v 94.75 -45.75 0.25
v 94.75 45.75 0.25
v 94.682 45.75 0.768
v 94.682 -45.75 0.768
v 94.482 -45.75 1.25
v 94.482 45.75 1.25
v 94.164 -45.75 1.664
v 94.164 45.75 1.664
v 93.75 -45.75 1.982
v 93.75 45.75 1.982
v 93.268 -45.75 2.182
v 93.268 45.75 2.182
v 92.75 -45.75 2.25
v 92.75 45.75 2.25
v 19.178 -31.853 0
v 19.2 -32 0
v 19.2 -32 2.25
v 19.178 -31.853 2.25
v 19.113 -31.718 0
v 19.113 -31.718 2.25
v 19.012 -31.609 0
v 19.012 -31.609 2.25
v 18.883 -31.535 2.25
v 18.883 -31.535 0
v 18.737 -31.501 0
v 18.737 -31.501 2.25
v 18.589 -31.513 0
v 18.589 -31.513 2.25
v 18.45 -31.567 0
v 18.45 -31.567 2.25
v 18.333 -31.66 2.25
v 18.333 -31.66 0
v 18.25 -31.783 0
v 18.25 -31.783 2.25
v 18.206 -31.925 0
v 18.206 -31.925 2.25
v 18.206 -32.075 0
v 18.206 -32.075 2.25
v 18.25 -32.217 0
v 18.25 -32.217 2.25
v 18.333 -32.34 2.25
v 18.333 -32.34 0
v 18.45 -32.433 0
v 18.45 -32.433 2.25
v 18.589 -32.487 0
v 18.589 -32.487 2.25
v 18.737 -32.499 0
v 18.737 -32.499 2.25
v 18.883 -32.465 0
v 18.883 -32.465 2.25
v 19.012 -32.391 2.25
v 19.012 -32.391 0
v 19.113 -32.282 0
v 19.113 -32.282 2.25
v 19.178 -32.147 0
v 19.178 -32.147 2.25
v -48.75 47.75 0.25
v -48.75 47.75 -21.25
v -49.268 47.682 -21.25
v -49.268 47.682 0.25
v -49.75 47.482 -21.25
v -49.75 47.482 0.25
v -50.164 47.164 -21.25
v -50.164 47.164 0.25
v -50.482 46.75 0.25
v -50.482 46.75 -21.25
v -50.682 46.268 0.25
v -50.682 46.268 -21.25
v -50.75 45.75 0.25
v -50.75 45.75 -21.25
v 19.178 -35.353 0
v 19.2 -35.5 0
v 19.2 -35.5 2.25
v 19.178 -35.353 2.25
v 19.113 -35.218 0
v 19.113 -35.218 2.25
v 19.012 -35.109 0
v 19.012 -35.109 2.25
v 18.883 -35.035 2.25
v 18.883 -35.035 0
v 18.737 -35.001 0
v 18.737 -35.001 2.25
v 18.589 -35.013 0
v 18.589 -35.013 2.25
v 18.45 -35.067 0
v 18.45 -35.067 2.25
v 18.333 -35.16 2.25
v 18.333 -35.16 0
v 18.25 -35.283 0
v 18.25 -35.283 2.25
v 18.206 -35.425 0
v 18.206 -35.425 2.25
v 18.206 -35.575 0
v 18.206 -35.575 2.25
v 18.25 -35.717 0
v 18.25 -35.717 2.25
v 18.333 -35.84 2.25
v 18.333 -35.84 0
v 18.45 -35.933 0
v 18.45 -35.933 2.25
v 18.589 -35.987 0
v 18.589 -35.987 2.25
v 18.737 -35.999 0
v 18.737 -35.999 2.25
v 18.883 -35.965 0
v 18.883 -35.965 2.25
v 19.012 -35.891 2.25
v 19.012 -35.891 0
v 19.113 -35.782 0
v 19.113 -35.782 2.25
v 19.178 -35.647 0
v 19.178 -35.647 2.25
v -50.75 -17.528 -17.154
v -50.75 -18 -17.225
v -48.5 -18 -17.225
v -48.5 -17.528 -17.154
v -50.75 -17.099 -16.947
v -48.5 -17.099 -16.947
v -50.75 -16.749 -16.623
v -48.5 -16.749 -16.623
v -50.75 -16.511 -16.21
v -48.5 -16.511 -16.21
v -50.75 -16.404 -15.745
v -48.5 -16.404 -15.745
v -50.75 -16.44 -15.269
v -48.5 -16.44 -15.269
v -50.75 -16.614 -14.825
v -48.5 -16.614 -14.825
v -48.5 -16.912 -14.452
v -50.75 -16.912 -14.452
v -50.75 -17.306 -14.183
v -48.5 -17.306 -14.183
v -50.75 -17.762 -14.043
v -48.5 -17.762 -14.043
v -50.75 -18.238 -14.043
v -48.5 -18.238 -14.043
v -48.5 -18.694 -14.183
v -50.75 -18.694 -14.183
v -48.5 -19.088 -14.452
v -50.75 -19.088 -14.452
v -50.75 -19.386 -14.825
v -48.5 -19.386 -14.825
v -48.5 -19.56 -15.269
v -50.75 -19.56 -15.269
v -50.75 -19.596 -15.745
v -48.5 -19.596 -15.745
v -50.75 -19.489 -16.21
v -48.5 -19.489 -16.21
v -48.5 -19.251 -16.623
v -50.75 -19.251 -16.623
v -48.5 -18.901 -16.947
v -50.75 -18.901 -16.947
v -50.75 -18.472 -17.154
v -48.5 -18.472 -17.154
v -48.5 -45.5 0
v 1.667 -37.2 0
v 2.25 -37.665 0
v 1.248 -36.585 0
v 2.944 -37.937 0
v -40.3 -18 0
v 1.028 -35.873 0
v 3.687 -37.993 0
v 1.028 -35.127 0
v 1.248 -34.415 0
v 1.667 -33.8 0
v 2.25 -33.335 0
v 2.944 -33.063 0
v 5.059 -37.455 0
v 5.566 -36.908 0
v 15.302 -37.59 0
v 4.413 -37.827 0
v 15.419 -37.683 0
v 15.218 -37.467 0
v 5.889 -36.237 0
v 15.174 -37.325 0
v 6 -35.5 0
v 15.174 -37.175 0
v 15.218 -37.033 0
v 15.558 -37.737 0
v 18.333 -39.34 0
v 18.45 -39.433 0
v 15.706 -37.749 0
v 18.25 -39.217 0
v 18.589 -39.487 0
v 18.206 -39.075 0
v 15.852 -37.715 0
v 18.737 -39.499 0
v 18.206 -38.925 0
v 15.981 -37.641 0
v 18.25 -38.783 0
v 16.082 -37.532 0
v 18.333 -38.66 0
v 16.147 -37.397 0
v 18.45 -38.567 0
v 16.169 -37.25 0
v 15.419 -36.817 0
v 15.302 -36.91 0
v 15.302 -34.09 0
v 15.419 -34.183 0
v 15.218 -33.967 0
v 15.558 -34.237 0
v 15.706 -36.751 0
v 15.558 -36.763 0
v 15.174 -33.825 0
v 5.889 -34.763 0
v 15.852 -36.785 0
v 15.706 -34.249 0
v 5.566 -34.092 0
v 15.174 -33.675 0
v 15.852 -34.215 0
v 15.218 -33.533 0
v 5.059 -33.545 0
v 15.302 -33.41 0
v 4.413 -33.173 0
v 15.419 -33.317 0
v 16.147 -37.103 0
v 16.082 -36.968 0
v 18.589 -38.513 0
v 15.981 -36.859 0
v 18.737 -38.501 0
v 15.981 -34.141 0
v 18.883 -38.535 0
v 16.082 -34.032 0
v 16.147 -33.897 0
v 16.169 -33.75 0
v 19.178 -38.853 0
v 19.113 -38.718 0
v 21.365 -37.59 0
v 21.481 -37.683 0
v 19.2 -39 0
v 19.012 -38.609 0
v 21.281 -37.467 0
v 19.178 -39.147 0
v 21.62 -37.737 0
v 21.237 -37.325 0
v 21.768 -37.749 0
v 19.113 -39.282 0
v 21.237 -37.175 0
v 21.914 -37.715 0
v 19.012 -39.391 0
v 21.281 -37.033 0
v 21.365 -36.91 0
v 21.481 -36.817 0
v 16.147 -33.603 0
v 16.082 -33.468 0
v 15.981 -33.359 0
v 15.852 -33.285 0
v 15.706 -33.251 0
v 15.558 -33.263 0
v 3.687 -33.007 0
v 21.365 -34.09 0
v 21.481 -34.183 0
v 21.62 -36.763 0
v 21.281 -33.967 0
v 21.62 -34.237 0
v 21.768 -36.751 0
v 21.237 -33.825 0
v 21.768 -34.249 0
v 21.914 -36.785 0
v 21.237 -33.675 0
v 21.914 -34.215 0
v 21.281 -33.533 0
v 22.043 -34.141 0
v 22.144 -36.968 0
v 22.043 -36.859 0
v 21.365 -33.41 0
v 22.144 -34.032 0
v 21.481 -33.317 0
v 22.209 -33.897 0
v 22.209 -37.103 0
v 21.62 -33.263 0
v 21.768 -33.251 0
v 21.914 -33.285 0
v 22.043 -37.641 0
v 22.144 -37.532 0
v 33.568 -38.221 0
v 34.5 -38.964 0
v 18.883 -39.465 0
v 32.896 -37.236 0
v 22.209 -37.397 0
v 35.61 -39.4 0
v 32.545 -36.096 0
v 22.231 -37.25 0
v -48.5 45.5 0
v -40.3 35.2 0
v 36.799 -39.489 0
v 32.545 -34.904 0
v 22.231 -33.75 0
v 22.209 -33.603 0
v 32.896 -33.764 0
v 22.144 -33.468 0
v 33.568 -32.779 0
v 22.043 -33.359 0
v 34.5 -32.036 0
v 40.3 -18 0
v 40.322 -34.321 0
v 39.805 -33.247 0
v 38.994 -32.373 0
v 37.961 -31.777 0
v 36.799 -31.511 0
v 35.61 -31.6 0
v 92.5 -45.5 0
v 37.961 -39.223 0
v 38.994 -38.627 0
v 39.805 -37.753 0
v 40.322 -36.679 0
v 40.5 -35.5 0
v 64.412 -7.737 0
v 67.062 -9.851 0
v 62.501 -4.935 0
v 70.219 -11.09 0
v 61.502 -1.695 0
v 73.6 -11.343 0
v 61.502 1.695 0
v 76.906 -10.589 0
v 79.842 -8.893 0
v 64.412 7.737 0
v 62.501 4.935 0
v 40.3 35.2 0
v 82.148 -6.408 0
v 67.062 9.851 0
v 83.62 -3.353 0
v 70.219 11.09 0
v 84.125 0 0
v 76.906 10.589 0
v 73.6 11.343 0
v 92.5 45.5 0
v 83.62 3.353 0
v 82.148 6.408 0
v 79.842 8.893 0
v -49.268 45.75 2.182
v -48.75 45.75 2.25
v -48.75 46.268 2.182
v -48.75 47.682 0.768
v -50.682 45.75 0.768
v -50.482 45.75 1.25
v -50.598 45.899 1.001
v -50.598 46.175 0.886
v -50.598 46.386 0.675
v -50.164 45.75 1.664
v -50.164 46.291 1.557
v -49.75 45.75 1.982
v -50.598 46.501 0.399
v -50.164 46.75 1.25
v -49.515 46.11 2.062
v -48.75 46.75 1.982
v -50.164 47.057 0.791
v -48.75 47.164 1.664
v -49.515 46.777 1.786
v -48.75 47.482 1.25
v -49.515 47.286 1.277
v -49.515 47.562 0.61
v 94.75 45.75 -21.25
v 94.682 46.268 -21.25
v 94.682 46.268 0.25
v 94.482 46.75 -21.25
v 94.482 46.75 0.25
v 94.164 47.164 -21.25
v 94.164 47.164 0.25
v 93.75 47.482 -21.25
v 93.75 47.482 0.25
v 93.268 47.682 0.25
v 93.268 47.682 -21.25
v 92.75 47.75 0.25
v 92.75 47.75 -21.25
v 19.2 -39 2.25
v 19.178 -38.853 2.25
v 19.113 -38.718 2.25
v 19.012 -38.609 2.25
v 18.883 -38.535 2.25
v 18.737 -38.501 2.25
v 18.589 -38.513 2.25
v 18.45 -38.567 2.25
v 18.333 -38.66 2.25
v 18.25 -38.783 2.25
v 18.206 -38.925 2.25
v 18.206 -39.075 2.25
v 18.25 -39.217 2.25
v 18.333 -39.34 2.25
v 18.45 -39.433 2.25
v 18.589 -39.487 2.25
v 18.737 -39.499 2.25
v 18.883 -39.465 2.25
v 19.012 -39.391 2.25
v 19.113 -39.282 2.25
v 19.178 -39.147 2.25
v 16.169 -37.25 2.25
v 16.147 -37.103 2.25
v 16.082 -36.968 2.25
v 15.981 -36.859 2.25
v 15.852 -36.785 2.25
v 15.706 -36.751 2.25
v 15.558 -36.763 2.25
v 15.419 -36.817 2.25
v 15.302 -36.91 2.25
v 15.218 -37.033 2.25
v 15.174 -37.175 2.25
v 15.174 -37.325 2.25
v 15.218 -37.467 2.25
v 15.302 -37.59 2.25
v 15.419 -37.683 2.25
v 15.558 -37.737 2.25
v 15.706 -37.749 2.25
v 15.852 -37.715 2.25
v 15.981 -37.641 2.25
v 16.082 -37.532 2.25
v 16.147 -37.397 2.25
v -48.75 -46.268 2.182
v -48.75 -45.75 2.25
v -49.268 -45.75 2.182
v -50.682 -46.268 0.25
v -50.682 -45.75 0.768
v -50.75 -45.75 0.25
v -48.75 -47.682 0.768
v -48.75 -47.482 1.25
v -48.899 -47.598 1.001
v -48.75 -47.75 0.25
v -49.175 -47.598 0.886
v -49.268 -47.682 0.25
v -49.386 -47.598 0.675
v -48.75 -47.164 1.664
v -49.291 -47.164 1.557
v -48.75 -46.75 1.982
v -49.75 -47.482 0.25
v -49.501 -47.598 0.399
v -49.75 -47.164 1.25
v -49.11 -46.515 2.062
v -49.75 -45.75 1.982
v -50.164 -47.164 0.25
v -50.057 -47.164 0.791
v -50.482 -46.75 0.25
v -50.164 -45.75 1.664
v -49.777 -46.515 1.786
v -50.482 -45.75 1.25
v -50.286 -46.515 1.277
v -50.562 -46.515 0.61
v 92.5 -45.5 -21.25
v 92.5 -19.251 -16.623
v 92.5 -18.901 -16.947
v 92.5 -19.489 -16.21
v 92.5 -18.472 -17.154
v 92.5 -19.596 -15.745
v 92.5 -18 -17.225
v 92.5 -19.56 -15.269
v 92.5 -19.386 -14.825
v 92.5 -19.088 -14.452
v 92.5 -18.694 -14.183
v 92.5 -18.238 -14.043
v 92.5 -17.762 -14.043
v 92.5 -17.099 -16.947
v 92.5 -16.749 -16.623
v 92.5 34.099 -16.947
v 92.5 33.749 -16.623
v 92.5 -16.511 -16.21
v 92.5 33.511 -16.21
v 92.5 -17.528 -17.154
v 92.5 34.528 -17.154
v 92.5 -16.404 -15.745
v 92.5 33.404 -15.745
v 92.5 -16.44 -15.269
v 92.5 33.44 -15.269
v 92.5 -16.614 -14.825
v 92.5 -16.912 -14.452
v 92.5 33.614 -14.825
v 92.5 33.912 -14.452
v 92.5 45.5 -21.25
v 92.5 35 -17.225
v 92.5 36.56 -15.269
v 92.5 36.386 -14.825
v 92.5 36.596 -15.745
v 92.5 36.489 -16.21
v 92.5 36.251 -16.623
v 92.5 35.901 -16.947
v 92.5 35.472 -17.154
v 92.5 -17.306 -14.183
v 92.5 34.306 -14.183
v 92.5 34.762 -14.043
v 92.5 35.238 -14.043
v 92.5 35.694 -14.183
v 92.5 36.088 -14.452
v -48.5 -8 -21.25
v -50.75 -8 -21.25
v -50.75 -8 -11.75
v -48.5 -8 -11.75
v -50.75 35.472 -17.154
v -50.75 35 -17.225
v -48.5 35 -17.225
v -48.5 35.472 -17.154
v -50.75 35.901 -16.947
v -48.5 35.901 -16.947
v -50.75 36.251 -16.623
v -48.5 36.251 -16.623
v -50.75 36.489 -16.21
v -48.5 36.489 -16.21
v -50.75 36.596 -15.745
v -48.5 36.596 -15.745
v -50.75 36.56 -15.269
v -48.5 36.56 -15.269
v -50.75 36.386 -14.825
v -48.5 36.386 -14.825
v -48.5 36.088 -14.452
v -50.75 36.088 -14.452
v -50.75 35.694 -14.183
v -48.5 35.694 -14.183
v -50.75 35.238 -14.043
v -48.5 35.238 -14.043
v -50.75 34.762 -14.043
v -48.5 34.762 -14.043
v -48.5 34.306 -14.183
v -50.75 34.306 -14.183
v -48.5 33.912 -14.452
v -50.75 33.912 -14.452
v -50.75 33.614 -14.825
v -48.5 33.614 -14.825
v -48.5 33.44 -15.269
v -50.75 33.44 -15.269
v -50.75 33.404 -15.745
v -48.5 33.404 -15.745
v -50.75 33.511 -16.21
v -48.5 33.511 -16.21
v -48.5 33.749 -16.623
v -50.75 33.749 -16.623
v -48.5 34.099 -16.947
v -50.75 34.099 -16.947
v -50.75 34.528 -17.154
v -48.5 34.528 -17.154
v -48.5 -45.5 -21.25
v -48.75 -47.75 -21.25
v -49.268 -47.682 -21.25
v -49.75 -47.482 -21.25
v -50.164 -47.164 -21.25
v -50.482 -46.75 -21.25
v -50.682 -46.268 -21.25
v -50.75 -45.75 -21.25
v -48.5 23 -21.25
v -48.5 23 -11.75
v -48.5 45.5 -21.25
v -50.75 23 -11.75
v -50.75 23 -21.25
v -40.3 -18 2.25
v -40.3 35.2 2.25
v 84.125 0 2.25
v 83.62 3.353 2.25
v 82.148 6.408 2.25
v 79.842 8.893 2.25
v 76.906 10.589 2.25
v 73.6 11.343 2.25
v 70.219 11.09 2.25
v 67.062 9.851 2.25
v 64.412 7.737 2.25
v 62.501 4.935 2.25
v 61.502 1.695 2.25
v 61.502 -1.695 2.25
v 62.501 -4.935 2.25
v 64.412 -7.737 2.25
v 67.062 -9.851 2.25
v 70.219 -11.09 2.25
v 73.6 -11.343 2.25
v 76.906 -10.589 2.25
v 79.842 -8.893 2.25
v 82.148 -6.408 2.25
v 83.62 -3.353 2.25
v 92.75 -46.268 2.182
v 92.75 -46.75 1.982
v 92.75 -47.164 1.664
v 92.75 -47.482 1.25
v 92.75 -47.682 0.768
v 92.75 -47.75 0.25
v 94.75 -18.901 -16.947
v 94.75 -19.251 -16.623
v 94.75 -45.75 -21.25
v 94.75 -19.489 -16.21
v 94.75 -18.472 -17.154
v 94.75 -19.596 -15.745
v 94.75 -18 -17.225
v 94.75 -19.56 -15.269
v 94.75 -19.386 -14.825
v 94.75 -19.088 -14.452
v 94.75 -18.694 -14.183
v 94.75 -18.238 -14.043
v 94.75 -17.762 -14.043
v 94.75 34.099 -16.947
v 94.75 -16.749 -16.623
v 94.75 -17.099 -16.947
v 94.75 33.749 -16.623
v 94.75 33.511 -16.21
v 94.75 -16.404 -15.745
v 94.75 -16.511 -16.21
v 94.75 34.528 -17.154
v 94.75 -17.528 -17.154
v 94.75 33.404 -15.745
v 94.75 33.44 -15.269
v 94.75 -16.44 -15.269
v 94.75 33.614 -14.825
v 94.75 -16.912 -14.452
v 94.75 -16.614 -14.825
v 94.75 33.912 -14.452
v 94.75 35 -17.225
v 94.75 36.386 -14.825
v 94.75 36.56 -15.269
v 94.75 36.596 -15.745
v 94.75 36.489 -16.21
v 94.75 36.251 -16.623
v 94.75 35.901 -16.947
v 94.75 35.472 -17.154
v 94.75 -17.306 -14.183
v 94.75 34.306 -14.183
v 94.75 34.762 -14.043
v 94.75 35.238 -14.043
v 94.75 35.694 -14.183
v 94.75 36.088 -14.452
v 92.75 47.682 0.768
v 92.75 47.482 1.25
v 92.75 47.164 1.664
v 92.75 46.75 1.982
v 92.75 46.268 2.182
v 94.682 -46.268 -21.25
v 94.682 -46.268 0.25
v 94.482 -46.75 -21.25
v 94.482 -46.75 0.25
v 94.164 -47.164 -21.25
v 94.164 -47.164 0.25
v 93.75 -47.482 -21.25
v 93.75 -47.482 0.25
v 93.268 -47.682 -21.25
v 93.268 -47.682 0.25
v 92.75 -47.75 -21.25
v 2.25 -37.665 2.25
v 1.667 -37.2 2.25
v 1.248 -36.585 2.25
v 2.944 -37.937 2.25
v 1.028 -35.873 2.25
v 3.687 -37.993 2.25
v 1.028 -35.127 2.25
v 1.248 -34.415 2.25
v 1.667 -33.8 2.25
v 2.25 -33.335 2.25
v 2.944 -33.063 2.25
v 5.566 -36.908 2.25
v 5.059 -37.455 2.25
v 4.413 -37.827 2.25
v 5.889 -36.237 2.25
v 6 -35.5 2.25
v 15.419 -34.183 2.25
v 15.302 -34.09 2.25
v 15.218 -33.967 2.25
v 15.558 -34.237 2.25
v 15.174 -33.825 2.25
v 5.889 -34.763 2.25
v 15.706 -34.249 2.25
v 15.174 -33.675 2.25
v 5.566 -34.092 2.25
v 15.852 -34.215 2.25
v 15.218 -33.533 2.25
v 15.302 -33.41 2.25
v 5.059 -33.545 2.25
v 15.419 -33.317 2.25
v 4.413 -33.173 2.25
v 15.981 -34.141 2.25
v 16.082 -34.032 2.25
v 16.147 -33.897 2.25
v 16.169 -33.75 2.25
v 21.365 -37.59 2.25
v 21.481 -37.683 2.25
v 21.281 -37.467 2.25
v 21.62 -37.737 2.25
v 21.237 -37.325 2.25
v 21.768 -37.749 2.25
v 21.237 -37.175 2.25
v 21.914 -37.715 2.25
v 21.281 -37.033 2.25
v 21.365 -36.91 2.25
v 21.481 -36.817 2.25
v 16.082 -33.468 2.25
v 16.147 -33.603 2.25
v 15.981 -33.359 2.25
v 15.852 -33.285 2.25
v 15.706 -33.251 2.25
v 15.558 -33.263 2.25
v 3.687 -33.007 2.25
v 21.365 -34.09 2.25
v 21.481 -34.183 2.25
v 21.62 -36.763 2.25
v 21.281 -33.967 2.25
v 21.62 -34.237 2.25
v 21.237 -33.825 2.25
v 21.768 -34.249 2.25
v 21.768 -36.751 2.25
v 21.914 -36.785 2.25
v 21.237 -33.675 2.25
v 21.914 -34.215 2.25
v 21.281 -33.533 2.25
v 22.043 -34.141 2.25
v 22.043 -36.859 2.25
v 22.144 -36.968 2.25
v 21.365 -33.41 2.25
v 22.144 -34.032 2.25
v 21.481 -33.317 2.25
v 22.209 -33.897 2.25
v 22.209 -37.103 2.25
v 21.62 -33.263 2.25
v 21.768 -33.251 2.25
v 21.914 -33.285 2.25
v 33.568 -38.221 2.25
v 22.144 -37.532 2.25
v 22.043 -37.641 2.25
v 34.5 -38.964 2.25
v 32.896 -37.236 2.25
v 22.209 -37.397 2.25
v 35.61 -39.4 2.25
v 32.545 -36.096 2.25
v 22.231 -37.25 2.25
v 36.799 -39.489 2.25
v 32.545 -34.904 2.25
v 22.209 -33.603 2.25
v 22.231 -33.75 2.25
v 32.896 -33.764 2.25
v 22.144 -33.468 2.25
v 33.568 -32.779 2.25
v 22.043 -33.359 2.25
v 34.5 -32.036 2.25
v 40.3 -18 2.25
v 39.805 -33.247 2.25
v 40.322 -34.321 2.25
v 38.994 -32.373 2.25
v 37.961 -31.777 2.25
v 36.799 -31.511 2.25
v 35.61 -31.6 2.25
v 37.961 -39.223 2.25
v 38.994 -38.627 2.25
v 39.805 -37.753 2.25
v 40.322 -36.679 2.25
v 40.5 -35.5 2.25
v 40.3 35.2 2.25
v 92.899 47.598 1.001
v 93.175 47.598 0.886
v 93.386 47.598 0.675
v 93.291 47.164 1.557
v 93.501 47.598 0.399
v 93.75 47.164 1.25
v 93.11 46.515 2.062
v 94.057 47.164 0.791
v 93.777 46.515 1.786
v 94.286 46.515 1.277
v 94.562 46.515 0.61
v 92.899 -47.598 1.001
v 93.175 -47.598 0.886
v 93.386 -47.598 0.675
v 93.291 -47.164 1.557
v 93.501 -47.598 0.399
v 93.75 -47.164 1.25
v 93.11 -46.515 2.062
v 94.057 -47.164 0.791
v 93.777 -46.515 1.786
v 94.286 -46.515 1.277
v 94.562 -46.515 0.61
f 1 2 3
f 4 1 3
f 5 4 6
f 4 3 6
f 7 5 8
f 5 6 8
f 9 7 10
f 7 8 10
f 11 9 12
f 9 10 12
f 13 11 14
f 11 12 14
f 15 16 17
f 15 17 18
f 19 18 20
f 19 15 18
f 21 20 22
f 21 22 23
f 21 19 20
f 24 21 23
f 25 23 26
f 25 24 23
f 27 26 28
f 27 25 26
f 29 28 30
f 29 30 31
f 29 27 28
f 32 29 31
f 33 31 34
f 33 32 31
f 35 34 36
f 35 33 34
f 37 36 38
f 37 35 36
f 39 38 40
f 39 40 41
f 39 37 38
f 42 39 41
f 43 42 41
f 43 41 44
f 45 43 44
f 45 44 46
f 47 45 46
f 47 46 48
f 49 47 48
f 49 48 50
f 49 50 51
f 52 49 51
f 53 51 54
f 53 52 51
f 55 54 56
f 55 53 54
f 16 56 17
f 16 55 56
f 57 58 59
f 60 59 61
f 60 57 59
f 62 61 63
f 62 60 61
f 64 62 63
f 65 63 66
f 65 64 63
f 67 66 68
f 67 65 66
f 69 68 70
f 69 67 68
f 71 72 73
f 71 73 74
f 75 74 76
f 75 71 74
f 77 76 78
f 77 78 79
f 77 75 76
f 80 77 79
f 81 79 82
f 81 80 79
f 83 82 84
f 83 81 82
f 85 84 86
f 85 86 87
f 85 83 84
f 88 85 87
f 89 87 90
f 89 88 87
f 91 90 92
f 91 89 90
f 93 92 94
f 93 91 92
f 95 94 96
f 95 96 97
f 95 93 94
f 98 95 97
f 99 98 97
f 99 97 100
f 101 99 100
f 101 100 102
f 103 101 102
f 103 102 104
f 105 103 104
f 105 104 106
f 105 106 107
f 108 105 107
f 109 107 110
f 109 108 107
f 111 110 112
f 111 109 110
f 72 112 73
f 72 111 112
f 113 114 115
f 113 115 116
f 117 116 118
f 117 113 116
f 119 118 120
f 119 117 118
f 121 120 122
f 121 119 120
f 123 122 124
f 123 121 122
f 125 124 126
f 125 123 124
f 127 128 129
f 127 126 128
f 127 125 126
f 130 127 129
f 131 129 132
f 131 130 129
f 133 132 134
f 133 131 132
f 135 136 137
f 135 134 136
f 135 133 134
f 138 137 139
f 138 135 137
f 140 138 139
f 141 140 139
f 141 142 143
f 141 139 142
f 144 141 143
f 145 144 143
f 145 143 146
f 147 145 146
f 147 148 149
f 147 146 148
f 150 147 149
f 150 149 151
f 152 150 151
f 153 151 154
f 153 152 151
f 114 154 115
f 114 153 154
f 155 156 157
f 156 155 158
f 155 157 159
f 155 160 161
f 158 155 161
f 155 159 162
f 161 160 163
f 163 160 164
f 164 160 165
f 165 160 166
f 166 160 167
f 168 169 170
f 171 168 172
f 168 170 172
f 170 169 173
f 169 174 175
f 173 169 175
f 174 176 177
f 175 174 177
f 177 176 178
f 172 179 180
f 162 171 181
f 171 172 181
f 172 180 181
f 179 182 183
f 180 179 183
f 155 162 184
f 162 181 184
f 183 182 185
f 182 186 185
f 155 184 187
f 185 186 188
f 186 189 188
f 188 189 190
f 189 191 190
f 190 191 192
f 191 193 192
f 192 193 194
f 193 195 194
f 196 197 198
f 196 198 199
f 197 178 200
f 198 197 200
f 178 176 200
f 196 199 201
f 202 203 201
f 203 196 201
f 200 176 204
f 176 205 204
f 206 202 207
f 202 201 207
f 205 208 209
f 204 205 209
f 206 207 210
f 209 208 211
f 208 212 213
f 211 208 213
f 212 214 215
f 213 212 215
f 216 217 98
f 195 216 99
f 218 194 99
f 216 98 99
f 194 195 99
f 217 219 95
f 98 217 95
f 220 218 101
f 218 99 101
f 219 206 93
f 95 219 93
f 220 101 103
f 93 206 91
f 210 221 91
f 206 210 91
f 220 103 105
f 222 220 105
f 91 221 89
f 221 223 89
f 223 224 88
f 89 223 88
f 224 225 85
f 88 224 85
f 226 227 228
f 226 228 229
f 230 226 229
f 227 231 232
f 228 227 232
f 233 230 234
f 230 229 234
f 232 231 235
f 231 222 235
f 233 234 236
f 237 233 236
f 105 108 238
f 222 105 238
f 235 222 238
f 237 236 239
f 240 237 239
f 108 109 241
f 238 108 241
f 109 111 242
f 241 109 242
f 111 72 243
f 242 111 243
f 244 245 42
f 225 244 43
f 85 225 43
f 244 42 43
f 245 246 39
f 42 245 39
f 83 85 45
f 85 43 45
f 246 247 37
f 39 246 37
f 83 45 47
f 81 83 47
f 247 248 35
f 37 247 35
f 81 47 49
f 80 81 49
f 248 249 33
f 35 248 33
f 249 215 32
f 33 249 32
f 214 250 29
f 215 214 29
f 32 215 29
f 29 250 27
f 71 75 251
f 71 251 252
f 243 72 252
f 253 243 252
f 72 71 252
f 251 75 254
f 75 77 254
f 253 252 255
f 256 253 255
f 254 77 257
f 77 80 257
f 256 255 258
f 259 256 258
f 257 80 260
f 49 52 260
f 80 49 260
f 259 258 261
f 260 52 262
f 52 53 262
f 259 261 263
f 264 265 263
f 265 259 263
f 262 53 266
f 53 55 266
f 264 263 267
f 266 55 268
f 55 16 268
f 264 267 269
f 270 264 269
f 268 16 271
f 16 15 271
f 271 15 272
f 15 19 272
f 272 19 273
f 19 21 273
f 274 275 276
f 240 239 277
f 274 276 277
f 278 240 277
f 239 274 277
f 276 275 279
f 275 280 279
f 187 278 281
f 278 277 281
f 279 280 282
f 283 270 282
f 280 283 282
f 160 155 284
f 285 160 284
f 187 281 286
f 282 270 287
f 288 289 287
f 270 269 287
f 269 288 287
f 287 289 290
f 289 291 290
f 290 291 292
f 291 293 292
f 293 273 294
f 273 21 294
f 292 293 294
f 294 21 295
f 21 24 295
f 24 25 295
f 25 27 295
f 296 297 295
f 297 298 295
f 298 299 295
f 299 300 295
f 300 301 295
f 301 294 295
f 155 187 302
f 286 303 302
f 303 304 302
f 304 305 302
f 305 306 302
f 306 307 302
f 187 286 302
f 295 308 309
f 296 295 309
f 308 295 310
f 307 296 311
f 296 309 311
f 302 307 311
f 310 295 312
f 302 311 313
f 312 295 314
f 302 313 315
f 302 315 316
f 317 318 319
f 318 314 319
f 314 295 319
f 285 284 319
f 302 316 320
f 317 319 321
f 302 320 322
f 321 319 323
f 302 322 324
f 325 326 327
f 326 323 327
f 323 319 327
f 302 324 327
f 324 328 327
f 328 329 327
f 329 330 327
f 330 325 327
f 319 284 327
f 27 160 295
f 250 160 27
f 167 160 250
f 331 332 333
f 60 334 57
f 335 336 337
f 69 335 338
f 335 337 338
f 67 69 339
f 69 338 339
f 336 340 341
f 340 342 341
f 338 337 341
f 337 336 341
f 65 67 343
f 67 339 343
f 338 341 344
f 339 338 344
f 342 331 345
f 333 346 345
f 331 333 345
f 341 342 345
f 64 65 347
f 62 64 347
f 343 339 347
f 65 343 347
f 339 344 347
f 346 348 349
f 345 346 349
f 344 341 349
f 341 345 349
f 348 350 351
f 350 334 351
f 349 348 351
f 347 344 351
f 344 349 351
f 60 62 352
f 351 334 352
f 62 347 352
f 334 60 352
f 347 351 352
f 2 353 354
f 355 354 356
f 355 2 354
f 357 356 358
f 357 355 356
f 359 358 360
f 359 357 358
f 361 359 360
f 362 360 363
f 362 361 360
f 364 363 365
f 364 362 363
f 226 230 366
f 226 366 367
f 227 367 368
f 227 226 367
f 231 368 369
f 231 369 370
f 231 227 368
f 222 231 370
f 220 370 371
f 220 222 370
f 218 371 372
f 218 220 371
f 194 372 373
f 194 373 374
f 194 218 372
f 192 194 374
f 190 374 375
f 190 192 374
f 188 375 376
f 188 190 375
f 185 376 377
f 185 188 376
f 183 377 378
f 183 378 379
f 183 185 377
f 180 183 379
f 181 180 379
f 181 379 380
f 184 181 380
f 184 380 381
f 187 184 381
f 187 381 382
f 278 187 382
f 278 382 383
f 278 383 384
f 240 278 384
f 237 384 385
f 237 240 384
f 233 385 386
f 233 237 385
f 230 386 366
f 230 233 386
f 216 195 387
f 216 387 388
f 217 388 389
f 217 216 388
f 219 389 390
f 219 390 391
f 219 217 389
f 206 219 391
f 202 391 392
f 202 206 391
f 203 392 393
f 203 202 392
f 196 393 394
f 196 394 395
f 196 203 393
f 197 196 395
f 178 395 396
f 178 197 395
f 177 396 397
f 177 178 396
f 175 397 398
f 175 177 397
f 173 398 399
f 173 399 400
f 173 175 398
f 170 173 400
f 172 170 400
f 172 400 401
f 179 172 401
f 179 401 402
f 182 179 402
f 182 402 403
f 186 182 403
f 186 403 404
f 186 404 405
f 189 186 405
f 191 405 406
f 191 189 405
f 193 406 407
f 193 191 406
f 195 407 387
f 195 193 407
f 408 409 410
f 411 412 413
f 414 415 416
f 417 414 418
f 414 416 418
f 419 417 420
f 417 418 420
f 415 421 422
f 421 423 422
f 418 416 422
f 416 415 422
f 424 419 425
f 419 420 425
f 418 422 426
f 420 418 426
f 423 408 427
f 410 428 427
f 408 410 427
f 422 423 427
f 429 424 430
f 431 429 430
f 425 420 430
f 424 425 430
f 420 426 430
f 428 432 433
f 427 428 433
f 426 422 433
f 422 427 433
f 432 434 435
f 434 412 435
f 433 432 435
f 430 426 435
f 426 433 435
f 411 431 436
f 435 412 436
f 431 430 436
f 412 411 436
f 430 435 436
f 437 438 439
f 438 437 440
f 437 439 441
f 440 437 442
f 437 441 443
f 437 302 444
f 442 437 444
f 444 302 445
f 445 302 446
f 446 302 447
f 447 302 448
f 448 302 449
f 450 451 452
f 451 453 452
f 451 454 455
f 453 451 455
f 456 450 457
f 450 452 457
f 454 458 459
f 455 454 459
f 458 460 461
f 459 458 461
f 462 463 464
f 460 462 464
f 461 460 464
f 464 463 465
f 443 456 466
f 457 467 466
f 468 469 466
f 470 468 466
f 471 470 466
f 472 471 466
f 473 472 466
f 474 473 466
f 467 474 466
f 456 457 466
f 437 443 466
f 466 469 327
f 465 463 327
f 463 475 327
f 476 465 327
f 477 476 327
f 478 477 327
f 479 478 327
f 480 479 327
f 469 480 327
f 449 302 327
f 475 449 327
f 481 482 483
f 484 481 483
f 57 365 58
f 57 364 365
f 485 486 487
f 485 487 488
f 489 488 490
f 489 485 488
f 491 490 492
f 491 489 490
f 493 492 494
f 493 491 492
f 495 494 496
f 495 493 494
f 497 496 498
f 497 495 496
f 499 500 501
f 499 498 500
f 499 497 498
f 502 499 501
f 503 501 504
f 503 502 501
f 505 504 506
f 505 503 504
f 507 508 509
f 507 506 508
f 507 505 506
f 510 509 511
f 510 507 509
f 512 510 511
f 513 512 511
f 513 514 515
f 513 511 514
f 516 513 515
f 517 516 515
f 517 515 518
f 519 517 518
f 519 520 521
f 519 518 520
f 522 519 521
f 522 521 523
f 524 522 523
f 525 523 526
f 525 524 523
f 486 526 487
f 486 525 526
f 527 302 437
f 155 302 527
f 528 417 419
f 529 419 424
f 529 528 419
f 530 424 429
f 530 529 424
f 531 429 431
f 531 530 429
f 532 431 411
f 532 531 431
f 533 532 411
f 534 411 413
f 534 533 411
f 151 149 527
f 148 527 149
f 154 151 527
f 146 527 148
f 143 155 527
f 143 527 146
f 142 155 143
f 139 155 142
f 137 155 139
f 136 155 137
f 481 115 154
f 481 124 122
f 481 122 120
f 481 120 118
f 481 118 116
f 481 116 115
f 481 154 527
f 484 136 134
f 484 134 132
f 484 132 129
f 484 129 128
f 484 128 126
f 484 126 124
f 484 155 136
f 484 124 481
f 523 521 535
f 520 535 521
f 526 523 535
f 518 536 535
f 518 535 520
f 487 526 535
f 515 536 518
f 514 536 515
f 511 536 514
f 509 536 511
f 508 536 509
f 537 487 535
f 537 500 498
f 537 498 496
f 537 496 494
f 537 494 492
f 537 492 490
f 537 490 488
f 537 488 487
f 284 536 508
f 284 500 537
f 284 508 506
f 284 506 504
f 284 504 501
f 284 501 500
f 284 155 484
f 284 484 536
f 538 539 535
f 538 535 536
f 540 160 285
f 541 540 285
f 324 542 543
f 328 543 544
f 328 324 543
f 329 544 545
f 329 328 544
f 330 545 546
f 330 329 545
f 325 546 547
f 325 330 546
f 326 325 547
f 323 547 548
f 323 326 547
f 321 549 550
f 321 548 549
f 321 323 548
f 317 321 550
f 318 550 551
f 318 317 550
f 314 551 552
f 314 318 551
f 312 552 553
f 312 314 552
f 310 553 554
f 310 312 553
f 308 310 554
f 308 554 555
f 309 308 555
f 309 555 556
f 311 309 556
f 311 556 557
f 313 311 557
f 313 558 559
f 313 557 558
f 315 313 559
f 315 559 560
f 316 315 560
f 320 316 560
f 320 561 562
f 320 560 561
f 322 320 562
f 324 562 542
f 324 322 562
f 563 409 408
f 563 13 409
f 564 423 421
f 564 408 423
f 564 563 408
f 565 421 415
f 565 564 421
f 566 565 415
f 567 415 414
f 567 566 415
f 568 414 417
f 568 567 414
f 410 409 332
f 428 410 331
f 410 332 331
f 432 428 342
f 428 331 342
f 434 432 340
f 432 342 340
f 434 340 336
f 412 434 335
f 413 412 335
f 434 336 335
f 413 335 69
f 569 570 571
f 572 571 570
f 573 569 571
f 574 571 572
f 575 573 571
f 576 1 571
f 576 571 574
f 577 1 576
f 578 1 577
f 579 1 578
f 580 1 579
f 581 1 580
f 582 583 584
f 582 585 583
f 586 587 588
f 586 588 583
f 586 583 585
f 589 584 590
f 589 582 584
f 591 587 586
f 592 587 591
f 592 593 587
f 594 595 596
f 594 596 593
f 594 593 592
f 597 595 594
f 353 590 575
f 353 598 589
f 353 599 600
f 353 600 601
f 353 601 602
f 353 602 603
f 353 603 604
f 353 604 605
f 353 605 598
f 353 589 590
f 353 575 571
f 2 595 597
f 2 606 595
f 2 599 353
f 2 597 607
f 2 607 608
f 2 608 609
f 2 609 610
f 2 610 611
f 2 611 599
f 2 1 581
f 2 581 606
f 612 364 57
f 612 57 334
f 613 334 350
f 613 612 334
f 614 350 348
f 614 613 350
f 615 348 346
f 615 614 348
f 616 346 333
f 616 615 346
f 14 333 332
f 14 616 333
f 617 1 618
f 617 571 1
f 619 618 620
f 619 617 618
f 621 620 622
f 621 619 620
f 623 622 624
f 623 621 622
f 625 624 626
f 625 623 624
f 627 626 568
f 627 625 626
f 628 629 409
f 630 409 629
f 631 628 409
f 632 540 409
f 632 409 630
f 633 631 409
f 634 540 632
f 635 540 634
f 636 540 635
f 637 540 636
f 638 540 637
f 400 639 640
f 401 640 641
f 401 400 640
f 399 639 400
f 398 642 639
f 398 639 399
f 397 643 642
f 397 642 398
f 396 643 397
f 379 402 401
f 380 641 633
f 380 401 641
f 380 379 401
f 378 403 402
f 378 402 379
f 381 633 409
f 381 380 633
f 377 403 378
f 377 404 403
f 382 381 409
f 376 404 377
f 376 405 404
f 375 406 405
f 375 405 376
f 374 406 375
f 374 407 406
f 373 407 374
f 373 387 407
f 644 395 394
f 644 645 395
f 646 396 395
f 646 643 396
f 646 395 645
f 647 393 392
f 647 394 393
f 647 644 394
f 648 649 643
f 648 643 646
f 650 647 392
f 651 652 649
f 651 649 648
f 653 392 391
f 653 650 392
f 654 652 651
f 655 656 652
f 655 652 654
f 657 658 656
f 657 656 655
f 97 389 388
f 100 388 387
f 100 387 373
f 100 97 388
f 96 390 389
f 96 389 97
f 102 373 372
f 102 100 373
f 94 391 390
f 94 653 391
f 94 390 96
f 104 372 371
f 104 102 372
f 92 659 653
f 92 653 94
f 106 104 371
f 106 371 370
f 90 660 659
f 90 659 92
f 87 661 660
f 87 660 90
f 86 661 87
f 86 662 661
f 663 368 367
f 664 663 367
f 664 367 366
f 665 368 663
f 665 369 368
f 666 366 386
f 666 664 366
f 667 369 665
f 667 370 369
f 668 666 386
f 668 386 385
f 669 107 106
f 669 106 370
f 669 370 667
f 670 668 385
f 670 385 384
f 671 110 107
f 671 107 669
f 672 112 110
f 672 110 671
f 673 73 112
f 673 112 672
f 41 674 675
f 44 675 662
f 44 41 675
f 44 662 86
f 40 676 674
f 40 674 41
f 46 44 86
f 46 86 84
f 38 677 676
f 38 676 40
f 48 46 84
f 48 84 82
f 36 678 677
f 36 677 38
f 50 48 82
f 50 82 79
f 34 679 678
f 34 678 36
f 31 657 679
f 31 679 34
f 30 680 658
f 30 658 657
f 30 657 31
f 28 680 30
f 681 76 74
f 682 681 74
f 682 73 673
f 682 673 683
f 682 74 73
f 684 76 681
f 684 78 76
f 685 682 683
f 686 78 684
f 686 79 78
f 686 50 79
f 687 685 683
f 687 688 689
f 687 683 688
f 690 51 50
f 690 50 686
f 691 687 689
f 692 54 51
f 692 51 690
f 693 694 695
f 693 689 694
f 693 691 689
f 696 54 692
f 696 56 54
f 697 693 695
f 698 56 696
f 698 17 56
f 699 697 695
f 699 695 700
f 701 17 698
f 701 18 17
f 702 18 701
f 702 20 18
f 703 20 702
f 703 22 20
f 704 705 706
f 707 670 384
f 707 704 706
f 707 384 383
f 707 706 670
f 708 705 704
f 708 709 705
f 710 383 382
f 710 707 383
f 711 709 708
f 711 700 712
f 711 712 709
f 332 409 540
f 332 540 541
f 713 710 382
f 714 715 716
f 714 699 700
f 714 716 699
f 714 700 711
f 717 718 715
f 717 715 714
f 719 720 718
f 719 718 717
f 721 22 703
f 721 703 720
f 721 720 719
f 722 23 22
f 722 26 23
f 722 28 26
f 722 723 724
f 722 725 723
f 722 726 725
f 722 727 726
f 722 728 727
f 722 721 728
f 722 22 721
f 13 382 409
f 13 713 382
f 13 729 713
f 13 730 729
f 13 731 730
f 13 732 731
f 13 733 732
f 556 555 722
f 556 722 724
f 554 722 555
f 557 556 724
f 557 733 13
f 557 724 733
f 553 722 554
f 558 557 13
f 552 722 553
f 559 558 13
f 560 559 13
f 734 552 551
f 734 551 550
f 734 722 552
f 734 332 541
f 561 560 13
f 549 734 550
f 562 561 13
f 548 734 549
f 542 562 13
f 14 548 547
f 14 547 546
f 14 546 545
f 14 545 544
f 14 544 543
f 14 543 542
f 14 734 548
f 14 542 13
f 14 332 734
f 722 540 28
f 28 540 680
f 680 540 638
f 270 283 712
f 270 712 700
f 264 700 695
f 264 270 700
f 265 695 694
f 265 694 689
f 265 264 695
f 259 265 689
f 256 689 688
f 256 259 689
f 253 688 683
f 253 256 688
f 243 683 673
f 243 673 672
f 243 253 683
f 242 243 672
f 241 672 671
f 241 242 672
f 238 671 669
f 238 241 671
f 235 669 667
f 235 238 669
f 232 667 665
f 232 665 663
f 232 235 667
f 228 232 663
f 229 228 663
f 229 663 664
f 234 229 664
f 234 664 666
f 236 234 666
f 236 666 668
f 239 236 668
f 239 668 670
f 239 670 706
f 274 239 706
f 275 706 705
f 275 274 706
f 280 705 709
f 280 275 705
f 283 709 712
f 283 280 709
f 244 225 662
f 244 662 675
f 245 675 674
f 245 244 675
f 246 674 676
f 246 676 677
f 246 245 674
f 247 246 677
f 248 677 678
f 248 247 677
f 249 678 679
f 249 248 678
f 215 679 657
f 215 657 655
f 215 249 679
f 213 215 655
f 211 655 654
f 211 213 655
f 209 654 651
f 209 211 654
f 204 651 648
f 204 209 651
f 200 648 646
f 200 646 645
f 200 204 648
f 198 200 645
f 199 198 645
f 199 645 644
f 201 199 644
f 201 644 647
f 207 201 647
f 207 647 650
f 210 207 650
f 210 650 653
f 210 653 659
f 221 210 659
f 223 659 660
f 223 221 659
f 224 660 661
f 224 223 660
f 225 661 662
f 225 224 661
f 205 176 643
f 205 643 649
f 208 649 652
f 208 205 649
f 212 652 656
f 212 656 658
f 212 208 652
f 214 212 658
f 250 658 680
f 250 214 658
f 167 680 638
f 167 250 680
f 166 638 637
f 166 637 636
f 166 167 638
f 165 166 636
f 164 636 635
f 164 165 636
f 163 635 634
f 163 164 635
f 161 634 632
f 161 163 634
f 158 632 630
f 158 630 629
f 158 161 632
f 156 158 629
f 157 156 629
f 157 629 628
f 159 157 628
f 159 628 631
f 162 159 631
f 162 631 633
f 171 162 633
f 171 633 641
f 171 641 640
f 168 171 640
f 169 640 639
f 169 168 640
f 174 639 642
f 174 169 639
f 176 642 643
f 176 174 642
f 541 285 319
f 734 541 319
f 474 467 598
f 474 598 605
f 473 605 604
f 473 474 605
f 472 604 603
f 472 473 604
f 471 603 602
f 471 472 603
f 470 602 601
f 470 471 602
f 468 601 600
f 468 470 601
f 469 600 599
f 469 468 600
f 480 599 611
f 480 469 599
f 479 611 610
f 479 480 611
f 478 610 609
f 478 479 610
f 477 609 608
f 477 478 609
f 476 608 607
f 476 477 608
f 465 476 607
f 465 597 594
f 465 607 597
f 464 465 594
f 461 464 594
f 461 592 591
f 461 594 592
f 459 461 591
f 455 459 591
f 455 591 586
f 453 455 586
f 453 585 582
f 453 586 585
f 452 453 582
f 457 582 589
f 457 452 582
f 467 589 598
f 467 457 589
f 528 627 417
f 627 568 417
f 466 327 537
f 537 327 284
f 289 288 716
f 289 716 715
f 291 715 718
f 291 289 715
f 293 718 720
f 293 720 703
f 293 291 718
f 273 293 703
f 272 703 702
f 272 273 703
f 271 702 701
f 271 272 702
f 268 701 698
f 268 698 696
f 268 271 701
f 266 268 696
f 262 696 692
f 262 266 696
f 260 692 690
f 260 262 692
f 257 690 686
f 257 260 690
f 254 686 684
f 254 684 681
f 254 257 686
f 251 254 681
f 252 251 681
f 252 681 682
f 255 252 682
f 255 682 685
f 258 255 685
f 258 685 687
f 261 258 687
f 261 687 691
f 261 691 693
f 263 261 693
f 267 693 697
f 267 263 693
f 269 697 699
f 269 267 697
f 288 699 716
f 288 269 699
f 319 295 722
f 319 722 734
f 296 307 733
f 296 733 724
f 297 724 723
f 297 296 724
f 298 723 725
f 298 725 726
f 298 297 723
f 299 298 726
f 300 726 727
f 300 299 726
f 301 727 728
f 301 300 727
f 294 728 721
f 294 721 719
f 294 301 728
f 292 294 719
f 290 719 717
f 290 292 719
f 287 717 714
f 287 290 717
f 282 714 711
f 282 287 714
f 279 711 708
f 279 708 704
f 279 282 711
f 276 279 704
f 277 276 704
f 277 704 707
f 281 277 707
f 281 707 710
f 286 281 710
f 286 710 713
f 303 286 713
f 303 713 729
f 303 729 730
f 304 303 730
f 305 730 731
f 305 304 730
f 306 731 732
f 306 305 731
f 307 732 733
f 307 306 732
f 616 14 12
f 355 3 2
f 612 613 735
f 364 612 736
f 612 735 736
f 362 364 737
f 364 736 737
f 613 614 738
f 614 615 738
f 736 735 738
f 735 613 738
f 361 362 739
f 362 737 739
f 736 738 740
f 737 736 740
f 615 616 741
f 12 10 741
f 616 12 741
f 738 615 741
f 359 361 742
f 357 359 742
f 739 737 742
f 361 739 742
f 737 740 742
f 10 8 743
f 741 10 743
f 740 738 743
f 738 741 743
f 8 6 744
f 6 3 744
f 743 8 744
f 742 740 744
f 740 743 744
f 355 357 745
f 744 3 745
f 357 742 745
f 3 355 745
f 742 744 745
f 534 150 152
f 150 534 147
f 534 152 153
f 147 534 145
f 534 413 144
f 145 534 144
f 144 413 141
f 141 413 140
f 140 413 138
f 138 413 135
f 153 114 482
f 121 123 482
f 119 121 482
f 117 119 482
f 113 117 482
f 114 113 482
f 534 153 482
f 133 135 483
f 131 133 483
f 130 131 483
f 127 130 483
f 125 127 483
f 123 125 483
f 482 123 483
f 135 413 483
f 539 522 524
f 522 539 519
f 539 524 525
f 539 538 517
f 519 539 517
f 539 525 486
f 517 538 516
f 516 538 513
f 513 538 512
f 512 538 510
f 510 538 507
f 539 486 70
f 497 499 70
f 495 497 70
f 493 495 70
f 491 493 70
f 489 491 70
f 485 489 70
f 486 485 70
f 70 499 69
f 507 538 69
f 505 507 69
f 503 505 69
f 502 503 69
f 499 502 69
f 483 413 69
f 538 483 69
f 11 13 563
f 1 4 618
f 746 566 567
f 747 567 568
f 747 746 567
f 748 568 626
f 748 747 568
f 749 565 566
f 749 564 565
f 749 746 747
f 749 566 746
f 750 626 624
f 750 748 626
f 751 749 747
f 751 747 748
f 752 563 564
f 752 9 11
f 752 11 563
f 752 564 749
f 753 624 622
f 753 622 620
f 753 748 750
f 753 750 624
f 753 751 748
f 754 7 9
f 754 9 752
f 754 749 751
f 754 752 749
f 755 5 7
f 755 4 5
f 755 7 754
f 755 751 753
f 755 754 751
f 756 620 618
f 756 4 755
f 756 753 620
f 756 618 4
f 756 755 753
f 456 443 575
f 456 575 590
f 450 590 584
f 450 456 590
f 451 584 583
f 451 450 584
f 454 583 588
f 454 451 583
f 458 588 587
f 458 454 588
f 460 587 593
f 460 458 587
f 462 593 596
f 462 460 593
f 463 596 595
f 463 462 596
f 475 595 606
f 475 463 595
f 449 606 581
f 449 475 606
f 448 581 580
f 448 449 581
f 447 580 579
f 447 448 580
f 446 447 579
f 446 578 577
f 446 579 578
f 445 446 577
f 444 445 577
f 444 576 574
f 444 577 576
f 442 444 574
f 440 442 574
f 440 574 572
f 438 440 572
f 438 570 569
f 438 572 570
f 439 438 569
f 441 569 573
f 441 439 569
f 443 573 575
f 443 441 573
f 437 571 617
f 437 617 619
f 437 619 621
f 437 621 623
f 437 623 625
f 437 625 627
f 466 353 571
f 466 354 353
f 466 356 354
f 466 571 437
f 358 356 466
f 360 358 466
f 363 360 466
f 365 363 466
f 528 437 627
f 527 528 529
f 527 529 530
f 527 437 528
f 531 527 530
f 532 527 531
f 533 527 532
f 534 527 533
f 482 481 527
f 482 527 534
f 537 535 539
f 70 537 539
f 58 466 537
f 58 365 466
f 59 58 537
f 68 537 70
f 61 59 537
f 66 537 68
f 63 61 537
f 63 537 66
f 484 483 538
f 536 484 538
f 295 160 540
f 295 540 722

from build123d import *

# Parameters (mm, degrees)
FACE_SKETCH_W                       = 145.5
FACE_SKETCH_H                       = 95.5
FACE_SKETCH_R                       = 0.5
FACE_SKETCH_R_2                     = 2.5
FACE_SKETCH_R_3                     = 4
FACE_SKETCH_W_2                     = 80.6
FACE_SKETCH_H_2                     = 53.2
FACE_EXTRUDE_DEPTH                  = 2.25
SKETCH1_R                           = 11.375
STOP_BUTTON_MOUNTING_HOLE_CUT_DEPTH = 107.125809773
WALLS_SKETCH_W                      = 145.5
WALLS_SKETCH_H                      = 95.5
WALLS_SKETCH_W_2                    = 141
WALLS_SKETCH_H_2                    = 91
WALLS_EXTRUDE_DEPTH                 = 21.25
SD_CARD_ACCESS_SKETCH_W             = 9.5
SD_CARD_ACCESS_SKETCH_H             = 31
SD_CARD_CUT_DEPTH                   = 2.5
EDGE_RADIUS_R                       = 2
TOP_CONNECTORS_CUT_DEPTH            = 109.208999164
TOP_CONNECTORS_CUT_DEPTH_BACK       = 109.208999164
TOP_CONNECTORS_SKETCH_R             = 1.6


with BuildPart() as part:
    # Face Sketch → Face Extrude (new body)
    with BuildSketch(Plane.XY):
        with Locations((22, 0)):
            Rectangle(FACE_SKETCH_W, FACE_SKETCH_H)
        with Locations((18.7, -35.5)):
            Circle(FACE_SKETCH_R, mode=Mode.SUBTRACT)
        with Locations((3.5, -35.5)):
            Circle(FACE_SKETCH_R_2, mode=Mode.SUBTRACT)
        with Locations((36.5, -35.5)):
            Circle(FACE_SKETCH_R_3, mode=Mode.SUBTRACT)
        with Locations((18.7, -32)):
            Circle(FACE_SKETCH_R, mode=Mode.SUBTRACT)
        with Locations((21.731088913, -33.75)):
            Circle(FACE_SKETCH_R, mode=Mode.SUBTRACT)
        with Locations((21.731088913, -37.25)):
            Circle(FACE_SKETCH_R, mode=Mode.SUBTRACT)
        with Locations((18.7, -39)):
            Circle(FACE_SKETCH_R, mode=Mode.SUBTRACT)
        with Locations((15.668911087, -37.25)):
            Circle(FACE_SKETCH_R, mode=Mode.SUBTRACT)
        with Locations((15.668911087, -33.75)):
            Circle(FACE_SKETCH_R, mode=Mode.SUBTRACT)
        with Locations((0, 8.6)):
            Rectangle(FACE_SKETCH_W_2, FACE_SKETCH_H_2, mode=Mode.SUBTRACT)
    extrude(amount=FACE_EXTRUDE_DEPTH)

    # Sketch1 → Stop Button Mounting Hole Cut (cut, through all)
    with BuildSketch(Plane.XY):
        with Locations((72.75, 0)):
            Circle(SKETCH1_R)
    extrude(amount=STOP_BUTTON_MOUNTING_HOLE_CUT_DEPTH, mode=Mode.SUBTRACT)

    # Walls Sketch → Walls Extrude (add)
    with BuildSketch(Plane(origin=(0, 0, 0), x_dir=(-1, 0, 0), z_dir=(0, 0, -1))):
        with Locations((-22, 0)):
            Rectangle(WALLS_SKETCH_W, WALLS_SKETCH_H)
        with Locations((-22, 0)):
            Rectangle(WALLS_SKETCH_W_2, WALLS_SKETCH_H_2, mode=Mode.SUBTRACT)
    extrude(amount=WALLS_EXTRUDE_DEPTH)

    # SD Card Access Sketch → SD Card Cut (cut)
    with BuildSketch(Plane.ZY.offset(50.75)):
        with Locations((-16.5, 7.5)):
            Rectangle(SD_CARD_ACCESS_SKETCH_W, SD_CARD_ACCESS_SKETCH_H)
    extrude(amount=-SD_CARD_CUT_DEPTH, mode=Mode.SUBTRACT)

    # Edge Radius
    edge_radius_edges = [part.edges().sort_by_distance(p)[0] for p in [
        (94.75, 0, 2.25),
        (22, 47.75, 2.25),
        (-50.75, 0, 2.25),
        (22, -47.75, 2.25),
        (-50.75, 47.75, -9.5),
        (94.75, 47.75, -9.5),
        (94.75, -47.75, -9.5),
        (-50.75, -47.75, -9.5),
    ]]
    fillet(edge_radius_edges, radius=EDGE_RADIUS_R)

    # Top Connectors Sketch → Top Connectors Cut (cut, two sides: drawn at the far end of the back side and taken through both)
    with BuildSketch(Plane(origin=(0, 0, 0), x_dir=(0, 0, -1), z_dir=(1, 0, 0)).offset(-TOP_CONNECTORS_CUT_DEPTH_BACK)):
        with Locations((15.625, 35)):
            Circle(TOP_CONNECTORS_SKETCH_R)
        with Locations((15.625, -18)):
            Circle(TOP_CONNECTORS_SKETCH_R)
    extrude(amount=TOP_CONNECTORS_CUT_DEPTH + TOP_CONNECTORS_CUT_DEPTH_BACK, mode=Mode.SUBTRACT)


solid = part.part
